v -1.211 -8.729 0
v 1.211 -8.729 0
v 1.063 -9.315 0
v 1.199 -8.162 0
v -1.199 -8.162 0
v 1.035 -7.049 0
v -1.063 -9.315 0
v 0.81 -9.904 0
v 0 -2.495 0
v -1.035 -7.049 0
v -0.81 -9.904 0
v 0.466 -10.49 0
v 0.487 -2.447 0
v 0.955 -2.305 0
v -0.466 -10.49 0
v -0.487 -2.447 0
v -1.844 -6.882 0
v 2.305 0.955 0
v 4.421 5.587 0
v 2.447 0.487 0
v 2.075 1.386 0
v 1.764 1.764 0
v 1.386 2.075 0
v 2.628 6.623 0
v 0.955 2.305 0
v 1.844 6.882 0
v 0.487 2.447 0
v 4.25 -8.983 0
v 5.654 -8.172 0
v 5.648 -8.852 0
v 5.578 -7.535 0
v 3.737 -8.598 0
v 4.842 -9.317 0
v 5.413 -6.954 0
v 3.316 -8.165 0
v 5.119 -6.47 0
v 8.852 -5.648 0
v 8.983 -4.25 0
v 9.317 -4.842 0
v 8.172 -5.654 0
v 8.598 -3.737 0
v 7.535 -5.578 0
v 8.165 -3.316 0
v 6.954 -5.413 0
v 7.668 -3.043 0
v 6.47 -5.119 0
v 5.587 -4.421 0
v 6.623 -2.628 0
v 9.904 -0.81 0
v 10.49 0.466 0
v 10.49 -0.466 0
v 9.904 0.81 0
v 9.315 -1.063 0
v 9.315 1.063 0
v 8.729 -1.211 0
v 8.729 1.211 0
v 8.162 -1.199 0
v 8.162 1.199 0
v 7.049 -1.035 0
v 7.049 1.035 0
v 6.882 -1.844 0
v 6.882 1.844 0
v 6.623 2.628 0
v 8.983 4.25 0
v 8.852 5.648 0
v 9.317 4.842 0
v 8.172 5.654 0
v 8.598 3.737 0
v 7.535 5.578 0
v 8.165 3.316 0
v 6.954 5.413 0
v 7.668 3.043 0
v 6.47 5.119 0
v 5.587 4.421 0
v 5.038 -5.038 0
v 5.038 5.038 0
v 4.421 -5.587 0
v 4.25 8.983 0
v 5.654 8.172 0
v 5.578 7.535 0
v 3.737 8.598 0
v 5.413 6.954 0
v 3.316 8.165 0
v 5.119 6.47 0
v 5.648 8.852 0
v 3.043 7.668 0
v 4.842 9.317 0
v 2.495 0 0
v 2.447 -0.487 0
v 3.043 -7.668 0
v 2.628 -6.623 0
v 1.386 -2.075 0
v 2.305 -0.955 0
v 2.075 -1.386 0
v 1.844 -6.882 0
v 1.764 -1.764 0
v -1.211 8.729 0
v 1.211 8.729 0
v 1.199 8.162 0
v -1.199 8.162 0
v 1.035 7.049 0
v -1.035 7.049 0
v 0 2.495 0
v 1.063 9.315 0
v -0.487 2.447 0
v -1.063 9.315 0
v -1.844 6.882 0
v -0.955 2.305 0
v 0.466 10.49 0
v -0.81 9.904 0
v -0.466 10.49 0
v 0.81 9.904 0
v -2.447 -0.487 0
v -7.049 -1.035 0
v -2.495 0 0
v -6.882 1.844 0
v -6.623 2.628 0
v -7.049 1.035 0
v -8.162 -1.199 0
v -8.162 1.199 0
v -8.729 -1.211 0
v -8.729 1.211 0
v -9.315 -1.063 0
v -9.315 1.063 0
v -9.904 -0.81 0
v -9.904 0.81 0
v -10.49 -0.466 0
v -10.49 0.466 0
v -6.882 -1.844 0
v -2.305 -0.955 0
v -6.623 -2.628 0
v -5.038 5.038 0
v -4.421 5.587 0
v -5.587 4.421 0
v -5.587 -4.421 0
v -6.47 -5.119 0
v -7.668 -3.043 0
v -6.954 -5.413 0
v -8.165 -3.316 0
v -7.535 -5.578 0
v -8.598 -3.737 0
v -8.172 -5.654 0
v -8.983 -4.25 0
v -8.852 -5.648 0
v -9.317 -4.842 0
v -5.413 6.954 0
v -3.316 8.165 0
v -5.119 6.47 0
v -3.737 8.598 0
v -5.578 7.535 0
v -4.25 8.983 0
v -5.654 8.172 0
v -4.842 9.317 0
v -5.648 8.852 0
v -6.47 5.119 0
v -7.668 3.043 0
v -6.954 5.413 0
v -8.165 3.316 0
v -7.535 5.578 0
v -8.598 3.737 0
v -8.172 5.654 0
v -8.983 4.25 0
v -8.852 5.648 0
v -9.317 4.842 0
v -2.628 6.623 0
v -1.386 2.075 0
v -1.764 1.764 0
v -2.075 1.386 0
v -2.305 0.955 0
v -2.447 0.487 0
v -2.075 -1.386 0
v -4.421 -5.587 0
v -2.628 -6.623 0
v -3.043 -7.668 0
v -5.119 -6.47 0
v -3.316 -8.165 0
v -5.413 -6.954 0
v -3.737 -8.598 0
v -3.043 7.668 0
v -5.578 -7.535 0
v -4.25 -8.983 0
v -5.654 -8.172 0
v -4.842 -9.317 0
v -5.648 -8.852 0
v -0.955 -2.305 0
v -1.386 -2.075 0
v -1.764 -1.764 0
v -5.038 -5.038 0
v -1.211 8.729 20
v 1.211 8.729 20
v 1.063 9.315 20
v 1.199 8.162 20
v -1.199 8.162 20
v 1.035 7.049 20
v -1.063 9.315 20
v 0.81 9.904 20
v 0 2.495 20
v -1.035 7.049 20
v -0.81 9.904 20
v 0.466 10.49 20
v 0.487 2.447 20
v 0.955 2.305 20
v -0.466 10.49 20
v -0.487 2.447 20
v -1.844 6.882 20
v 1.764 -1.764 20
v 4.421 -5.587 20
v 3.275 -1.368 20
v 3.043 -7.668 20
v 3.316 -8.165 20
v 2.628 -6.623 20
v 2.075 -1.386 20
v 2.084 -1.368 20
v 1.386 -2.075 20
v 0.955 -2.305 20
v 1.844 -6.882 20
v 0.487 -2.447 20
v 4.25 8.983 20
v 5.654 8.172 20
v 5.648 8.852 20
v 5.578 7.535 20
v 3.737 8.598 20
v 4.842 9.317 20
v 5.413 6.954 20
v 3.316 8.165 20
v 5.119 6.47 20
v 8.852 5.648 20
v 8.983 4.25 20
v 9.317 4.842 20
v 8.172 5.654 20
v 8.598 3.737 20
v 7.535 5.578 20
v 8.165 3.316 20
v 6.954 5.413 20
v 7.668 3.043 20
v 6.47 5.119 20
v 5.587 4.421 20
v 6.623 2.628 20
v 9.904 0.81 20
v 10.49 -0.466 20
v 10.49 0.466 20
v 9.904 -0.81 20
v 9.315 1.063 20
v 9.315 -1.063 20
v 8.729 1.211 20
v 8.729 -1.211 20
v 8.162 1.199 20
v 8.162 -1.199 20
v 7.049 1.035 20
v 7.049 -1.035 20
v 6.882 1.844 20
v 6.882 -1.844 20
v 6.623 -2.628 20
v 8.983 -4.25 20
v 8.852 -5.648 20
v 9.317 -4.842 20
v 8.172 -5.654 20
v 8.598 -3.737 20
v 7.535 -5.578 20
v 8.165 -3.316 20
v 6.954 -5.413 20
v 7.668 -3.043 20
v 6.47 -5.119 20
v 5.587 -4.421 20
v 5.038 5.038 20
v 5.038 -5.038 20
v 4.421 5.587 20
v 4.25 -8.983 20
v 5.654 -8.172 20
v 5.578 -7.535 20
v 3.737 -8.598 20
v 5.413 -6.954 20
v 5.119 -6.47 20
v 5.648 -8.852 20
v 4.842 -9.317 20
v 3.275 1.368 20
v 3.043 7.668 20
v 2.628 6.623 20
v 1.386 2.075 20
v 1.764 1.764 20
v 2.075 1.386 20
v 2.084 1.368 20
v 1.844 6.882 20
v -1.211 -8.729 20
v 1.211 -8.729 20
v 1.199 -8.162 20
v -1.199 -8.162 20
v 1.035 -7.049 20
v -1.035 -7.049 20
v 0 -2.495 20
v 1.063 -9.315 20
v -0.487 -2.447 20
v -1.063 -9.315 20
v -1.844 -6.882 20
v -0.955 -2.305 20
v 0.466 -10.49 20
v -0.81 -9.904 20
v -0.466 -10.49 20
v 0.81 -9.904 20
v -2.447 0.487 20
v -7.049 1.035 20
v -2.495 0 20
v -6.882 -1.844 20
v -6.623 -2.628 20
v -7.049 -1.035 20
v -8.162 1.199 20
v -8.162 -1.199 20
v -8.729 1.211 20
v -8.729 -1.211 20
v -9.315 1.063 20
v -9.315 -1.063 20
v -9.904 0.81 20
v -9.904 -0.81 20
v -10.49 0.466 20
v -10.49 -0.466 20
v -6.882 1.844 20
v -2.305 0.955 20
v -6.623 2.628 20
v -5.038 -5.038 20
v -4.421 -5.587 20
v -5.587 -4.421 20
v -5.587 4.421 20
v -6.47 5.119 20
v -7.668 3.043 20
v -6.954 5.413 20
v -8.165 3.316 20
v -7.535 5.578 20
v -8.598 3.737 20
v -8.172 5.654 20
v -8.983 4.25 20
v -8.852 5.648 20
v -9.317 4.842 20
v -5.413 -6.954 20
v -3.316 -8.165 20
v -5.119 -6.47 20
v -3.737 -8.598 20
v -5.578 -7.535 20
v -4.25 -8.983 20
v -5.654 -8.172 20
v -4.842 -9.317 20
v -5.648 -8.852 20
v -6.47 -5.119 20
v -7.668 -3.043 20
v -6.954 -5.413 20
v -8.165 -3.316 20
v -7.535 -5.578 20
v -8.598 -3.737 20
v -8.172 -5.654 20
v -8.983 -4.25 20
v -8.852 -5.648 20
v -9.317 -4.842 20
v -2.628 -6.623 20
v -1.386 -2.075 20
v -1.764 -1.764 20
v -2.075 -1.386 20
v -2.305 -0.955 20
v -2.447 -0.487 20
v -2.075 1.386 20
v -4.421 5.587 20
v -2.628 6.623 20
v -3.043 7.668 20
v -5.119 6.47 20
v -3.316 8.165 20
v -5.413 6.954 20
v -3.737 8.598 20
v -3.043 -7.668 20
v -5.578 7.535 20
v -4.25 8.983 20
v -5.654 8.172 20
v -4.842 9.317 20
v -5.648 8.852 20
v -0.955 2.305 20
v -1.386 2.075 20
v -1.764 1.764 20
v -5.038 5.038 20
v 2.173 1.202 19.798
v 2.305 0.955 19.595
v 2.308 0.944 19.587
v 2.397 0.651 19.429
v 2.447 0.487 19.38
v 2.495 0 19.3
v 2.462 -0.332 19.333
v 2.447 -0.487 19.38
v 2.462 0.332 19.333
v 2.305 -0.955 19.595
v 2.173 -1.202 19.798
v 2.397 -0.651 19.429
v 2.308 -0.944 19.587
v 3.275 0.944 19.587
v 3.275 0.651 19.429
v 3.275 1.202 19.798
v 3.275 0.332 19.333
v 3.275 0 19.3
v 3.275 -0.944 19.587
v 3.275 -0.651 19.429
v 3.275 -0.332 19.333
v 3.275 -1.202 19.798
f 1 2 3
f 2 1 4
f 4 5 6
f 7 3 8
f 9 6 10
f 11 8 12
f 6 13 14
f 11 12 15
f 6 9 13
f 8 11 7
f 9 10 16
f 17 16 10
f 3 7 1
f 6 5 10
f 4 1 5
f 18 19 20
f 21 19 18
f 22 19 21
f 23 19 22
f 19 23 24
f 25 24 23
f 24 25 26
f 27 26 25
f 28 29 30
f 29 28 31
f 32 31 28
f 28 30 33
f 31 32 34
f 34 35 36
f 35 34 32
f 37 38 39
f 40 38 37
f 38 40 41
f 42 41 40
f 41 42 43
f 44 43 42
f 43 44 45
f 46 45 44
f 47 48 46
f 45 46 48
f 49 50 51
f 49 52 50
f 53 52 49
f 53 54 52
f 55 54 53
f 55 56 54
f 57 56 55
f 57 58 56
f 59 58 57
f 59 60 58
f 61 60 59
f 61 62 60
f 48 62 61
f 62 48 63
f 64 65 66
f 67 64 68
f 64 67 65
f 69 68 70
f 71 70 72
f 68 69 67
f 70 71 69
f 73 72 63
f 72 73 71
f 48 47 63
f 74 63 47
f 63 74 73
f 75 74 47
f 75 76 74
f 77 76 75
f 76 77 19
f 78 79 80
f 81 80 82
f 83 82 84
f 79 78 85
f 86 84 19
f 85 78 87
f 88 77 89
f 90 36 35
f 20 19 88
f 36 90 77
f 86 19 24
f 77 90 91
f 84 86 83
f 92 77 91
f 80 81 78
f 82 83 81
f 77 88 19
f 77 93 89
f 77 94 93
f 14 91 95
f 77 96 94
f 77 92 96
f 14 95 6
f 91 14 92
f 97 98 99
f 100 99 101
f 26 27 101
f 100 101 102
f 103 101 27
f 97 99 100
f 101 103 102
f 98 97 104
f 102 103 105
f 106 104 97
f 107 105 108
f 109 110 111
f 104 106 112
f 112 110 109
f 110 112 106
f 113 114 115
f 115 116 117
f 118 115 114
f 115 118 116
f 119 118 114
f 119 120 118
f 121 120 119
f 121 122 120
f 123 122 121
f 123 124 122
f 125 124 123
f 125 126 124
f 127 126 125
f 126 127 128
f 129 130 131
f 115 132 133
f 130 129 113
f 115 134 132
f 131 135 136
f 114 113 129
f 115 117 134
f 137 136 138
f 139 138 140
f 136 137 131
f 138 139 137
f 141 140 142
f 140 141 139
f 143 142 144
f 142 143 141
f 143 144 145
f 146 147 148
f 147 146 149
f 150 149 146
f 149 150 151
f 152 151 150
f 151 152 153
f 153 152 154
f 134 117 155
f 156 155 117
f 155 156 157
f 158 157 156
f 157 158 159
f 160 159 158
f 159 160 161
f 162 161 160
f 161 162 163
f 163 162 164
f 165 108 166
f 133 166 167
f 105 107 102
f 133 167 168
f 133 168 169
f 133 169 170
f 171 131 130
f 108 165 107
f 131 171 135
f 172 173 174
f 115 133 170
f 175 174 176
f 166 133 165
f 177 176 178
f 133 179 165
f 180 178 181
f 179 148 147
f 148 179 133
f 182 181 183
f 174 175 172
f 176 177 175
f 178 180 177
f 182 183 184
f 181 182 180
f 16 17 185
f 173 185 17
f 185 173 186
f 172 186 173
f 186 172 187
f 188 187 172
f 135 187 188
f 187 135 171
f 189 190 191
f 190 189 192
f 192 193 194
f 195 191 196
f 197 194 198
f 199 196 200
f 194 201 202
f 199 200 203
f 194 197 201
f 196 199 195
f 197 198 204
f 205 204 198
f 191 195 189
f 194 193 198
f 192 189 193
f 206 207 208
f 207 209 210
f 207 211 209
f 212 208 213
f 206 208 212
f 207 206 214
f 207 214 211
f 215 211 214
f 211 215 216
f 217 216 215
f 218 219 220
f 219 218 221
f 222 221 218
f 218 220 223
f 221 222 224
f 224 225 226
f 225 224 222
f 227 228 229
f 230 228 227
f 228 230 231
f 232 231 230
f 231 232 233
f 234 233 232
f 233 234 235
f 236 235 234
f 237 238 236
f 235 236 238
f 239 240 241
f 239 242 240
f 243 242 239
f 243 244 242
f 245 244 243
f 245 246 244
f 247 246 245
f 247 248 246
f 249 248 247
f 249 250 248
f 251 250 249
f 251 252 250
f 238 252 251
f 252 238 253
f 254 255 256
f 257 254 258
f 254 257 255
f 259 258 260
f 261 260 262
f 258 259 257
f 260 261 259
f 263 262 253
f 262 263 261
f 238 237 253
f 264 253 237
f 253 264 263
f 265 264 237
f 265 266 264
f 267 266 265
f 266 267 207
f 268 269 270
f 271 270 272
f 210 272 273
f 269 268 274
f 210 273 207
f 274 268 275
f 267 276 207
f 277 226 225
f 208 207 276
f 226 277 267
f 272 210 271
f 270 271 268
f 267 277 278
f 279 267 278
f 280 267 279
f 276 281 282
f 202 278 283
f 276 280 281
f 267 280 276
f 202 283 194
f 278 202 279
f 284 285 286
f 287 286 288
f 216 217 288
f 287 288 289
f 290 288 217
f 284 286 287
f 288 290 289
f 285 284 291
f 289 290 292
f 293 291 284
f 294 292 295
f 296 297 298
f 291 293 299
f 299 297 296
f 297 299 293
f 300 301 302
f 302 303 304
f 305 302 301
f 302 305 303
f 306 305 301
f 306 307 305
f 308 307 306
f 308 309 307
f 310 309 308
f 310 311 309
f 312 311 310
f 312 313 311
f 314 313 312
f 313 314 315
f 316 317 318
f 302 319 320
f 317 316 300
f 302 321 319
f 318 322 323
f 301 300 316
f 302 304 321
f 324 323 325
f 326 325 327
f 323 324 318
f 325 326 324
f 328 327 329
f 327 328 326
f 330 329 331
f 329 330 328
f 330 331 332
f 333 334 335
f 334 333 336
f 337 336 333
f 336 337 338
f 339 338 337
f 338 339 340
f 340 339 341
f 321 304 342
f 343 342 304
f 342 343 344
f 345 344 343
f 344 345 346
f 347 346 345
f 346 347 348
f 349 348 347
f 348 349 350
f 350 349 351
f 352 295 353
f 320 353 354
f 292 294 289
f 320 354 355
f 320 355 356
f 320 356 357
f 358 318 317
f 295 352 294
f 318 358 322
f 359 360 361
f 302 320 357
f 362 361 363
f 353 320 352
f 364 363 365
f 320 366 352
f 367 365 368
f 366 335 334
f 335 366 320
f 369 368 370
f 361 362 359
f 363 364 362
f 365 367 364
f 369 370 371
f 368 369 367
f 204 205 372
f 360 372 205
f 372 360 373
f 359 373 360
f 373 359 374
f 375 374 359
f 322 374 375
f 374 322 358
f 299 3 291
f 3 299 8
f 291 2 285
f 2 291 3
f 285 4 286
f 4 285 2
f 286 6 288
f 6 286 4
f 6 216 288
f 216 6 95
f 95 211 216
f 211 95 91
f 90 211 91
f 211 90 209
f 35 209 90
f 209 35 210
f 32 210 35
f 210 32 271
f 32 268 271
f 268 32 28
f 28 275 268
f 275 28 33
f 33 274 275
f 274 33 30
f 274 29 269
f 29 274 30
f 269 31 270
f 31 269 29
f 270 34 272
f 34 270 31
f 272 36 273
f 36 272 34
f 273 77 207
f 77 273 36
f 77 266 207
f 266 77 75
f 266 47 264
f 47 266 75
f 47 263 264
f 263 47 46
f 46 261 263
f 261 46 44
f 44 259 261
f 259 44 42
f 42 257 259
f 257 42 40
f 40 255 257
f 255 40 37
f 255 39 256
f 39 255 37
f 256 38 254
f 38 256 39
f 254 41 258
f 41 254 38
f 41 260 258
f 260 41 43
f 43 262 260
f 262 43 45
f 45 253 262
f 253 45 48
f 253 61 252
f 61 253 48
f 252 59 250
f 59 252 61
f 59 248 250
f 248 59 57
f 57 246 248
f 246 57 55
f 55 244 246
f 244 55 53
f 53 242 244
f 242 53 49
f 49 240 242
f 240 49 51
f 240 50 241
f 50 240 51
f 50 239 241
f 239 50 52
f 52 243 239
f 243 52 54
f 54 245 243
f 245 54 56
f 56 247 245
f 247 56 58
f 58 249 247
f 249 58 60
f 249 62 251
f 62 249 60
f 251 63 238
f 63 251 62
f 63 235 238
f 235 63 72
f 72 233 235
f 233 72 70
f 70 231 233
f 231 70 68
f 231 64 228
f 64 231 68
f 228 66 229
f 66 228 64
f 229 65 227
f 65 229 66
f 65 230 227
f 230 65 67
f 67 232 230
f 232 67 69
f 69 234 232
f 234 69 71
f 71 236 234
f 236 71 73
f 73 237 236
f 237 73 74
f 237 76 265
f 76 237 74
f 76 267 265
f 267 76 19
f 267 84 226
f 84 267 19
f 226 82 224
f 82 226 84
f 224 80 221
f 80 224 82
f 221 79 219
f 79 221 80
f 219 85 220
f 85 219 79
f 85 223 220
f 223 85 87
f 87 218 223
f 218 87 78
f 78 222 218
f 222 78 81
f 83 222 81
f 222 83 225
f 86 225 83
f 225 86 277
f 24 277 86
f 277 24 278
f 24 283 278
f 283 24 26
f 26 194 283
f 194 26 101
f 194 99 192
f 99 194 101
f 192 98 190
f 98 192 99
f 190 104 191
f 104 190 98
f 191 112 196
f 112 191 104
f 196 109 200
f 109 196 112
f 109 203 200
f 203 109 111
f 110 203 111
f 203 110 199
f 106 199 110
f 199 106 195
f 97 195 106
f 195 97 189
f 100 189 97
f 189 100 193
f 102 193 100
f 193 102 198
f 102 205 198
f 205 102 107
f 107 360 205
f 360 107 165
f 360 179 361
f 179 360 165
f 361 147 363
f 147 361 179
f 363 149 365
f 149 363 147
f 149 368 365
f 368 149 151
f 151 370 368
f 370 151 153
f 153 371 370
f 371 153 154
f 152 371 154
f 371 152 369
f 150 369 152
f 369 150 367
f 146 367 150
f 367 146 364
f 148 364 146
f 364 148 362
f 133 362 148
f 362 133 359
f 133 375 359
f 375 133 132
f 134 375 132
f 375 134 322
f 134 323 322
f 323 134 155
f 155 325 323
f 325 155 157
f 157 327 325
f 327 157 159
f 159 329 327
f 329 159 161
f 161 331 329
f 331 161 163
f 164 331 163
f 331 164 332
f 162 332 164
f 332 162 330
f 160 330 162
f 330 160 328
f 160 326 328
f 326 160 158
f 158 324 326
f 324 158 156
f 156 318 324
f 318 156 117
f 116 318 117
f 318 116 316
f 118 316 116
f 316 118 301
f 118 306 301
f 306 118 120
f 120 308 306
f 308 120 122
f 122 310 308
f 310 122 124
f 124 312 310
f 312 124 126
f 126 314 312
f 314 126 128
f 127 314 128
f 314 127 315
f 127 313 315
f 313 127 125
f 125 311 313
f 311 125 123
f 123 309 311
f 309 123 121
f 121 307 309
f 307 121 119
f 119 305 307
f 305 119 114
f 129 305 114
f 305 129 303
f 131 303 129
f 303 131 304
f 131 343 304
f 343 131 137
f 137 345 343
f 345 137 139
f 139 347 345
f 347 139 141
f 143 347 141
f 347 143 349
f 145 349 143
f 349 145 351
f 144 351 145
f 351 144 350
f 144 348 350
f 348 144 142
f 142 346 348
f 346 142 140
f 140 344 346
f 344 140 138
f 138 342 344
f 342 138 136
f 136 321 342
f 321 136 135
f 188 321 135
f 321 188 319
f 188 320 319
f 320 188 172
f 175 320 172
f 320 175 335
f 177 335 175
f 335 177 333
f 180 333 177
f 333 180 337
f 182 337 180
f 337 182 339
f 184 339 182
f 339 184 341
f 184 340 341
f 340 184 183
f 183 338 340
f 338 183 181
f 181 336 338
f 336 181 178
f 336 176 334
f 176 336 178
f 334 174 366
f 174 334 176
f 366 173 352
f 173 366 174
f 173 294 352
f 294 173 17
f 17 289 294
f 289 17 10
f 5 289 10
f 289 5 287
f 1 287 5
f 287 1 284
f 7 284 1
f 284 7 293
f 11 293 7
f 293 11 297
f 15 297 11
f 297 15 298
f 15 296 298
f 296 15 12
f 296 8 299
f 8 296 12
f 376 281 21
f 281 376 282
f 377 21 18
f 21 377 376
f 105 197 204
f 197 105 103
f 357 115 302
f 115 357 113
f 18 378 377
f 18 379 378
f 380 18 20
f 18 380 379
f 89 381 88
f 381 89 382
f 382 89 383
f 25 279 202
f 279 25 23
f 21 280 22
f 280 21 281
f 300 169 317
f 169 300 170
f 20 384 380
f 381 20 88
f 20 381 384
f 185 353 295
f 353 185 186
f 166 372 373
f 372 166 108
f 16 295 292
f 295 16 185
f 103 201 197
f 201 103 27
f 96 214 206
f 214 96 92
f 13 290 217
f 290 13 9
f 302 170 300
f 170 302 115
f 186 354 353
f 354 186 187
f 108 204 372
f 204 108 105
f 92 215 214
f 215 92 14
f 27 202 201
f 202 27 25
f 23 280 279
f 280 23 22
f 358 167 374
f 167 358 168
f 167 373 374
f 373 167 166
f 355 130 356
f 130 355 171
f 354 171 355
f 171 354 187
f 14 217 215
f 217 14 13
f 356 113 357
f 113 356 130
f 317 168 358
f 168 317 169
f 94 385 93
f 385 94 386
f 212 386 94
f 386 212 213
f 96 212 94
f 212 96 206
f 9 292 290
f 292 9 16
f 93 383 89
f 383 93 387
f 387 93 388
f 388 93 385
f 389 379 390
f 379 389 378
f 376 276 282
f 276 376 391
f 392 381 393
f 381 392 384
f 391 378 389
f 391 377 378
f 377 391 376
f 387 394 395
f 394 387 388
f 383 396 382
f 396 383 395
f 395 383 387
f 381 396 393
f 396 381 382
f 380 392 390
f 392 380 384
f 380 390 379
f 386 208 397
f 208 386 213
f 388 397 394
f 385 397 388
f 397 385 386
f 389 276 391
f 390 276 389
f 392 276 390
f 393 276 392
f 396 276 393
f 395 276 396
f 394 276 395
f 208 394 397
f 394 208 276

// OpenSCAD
$fn = 32;

// ----------------------------------------------------------------------
// Spur gear: m=1.5 z=12, 21 mm tip diameter x 20 mm
// ----------------------------------------------------------------------

// --- parameters (mm) ---
modul = 1.5;              // module
n_teeth = 12;             // number of teeth
width = 20;               // face width
pa = 20;                  // pressure angle, deg
shaft_d = 4.99;           // shaft bore
set_d = 3.4;              // set screw tap hole
set_z = 21;               // set screw height

/* --- involute profile --- */
pitch_r = modul * n_teeth / 2;
base_r = pitch_r * cos(pa);
tip_r = pitch_r + modul;
root_r = pitch_r - 1.25 * modul;
flank_steps = 6;

function inv_deg(a) = (tan(a) - a * PI / 180) * 180 / PI;
function flank_r(i) = root_r + (tip_r - root_r) * i / flank_steps;
function half_angle(r) = 90 / n_teeth + inv_deg(pa) - inv_deg(acos(min(1, base_r / r)));
function tooth_pt(k, i, side) =
    let (r = flank_r(i), a = k * 360 / n_teeth + side * half_angle(r))
    [r * cos(a), r * sin(a)];

module tooth_profile() {
  polygon(points = [
    for (k = [0 : n_teeth - 1])
      each [
        for (i = [0 : flank_steps]) tooth_pt(k, i, -1),
        for (i = [flank_steps : -1 : 0]) tooth_pt(k, i, 1),
        let (ta = (k + 0.5) * 360 / n_teeth)
          [root_r * cos(ta), root_r * sin(ta)]
      ]
  ]);
}

module gear_disc() {
  linear_extrude(height = width) tooth_profile();
}

difference() {
  gear_disc();
  translate([0, 0, -1]) cylinder(h = width + 3, d = shaft_d);
  /* set screw, drilled radially */
  translate([-1, 0, set_z]) rotate([0, 90, 0]) cylinder(h = (root_r * 0.6), d = set_d);
}
